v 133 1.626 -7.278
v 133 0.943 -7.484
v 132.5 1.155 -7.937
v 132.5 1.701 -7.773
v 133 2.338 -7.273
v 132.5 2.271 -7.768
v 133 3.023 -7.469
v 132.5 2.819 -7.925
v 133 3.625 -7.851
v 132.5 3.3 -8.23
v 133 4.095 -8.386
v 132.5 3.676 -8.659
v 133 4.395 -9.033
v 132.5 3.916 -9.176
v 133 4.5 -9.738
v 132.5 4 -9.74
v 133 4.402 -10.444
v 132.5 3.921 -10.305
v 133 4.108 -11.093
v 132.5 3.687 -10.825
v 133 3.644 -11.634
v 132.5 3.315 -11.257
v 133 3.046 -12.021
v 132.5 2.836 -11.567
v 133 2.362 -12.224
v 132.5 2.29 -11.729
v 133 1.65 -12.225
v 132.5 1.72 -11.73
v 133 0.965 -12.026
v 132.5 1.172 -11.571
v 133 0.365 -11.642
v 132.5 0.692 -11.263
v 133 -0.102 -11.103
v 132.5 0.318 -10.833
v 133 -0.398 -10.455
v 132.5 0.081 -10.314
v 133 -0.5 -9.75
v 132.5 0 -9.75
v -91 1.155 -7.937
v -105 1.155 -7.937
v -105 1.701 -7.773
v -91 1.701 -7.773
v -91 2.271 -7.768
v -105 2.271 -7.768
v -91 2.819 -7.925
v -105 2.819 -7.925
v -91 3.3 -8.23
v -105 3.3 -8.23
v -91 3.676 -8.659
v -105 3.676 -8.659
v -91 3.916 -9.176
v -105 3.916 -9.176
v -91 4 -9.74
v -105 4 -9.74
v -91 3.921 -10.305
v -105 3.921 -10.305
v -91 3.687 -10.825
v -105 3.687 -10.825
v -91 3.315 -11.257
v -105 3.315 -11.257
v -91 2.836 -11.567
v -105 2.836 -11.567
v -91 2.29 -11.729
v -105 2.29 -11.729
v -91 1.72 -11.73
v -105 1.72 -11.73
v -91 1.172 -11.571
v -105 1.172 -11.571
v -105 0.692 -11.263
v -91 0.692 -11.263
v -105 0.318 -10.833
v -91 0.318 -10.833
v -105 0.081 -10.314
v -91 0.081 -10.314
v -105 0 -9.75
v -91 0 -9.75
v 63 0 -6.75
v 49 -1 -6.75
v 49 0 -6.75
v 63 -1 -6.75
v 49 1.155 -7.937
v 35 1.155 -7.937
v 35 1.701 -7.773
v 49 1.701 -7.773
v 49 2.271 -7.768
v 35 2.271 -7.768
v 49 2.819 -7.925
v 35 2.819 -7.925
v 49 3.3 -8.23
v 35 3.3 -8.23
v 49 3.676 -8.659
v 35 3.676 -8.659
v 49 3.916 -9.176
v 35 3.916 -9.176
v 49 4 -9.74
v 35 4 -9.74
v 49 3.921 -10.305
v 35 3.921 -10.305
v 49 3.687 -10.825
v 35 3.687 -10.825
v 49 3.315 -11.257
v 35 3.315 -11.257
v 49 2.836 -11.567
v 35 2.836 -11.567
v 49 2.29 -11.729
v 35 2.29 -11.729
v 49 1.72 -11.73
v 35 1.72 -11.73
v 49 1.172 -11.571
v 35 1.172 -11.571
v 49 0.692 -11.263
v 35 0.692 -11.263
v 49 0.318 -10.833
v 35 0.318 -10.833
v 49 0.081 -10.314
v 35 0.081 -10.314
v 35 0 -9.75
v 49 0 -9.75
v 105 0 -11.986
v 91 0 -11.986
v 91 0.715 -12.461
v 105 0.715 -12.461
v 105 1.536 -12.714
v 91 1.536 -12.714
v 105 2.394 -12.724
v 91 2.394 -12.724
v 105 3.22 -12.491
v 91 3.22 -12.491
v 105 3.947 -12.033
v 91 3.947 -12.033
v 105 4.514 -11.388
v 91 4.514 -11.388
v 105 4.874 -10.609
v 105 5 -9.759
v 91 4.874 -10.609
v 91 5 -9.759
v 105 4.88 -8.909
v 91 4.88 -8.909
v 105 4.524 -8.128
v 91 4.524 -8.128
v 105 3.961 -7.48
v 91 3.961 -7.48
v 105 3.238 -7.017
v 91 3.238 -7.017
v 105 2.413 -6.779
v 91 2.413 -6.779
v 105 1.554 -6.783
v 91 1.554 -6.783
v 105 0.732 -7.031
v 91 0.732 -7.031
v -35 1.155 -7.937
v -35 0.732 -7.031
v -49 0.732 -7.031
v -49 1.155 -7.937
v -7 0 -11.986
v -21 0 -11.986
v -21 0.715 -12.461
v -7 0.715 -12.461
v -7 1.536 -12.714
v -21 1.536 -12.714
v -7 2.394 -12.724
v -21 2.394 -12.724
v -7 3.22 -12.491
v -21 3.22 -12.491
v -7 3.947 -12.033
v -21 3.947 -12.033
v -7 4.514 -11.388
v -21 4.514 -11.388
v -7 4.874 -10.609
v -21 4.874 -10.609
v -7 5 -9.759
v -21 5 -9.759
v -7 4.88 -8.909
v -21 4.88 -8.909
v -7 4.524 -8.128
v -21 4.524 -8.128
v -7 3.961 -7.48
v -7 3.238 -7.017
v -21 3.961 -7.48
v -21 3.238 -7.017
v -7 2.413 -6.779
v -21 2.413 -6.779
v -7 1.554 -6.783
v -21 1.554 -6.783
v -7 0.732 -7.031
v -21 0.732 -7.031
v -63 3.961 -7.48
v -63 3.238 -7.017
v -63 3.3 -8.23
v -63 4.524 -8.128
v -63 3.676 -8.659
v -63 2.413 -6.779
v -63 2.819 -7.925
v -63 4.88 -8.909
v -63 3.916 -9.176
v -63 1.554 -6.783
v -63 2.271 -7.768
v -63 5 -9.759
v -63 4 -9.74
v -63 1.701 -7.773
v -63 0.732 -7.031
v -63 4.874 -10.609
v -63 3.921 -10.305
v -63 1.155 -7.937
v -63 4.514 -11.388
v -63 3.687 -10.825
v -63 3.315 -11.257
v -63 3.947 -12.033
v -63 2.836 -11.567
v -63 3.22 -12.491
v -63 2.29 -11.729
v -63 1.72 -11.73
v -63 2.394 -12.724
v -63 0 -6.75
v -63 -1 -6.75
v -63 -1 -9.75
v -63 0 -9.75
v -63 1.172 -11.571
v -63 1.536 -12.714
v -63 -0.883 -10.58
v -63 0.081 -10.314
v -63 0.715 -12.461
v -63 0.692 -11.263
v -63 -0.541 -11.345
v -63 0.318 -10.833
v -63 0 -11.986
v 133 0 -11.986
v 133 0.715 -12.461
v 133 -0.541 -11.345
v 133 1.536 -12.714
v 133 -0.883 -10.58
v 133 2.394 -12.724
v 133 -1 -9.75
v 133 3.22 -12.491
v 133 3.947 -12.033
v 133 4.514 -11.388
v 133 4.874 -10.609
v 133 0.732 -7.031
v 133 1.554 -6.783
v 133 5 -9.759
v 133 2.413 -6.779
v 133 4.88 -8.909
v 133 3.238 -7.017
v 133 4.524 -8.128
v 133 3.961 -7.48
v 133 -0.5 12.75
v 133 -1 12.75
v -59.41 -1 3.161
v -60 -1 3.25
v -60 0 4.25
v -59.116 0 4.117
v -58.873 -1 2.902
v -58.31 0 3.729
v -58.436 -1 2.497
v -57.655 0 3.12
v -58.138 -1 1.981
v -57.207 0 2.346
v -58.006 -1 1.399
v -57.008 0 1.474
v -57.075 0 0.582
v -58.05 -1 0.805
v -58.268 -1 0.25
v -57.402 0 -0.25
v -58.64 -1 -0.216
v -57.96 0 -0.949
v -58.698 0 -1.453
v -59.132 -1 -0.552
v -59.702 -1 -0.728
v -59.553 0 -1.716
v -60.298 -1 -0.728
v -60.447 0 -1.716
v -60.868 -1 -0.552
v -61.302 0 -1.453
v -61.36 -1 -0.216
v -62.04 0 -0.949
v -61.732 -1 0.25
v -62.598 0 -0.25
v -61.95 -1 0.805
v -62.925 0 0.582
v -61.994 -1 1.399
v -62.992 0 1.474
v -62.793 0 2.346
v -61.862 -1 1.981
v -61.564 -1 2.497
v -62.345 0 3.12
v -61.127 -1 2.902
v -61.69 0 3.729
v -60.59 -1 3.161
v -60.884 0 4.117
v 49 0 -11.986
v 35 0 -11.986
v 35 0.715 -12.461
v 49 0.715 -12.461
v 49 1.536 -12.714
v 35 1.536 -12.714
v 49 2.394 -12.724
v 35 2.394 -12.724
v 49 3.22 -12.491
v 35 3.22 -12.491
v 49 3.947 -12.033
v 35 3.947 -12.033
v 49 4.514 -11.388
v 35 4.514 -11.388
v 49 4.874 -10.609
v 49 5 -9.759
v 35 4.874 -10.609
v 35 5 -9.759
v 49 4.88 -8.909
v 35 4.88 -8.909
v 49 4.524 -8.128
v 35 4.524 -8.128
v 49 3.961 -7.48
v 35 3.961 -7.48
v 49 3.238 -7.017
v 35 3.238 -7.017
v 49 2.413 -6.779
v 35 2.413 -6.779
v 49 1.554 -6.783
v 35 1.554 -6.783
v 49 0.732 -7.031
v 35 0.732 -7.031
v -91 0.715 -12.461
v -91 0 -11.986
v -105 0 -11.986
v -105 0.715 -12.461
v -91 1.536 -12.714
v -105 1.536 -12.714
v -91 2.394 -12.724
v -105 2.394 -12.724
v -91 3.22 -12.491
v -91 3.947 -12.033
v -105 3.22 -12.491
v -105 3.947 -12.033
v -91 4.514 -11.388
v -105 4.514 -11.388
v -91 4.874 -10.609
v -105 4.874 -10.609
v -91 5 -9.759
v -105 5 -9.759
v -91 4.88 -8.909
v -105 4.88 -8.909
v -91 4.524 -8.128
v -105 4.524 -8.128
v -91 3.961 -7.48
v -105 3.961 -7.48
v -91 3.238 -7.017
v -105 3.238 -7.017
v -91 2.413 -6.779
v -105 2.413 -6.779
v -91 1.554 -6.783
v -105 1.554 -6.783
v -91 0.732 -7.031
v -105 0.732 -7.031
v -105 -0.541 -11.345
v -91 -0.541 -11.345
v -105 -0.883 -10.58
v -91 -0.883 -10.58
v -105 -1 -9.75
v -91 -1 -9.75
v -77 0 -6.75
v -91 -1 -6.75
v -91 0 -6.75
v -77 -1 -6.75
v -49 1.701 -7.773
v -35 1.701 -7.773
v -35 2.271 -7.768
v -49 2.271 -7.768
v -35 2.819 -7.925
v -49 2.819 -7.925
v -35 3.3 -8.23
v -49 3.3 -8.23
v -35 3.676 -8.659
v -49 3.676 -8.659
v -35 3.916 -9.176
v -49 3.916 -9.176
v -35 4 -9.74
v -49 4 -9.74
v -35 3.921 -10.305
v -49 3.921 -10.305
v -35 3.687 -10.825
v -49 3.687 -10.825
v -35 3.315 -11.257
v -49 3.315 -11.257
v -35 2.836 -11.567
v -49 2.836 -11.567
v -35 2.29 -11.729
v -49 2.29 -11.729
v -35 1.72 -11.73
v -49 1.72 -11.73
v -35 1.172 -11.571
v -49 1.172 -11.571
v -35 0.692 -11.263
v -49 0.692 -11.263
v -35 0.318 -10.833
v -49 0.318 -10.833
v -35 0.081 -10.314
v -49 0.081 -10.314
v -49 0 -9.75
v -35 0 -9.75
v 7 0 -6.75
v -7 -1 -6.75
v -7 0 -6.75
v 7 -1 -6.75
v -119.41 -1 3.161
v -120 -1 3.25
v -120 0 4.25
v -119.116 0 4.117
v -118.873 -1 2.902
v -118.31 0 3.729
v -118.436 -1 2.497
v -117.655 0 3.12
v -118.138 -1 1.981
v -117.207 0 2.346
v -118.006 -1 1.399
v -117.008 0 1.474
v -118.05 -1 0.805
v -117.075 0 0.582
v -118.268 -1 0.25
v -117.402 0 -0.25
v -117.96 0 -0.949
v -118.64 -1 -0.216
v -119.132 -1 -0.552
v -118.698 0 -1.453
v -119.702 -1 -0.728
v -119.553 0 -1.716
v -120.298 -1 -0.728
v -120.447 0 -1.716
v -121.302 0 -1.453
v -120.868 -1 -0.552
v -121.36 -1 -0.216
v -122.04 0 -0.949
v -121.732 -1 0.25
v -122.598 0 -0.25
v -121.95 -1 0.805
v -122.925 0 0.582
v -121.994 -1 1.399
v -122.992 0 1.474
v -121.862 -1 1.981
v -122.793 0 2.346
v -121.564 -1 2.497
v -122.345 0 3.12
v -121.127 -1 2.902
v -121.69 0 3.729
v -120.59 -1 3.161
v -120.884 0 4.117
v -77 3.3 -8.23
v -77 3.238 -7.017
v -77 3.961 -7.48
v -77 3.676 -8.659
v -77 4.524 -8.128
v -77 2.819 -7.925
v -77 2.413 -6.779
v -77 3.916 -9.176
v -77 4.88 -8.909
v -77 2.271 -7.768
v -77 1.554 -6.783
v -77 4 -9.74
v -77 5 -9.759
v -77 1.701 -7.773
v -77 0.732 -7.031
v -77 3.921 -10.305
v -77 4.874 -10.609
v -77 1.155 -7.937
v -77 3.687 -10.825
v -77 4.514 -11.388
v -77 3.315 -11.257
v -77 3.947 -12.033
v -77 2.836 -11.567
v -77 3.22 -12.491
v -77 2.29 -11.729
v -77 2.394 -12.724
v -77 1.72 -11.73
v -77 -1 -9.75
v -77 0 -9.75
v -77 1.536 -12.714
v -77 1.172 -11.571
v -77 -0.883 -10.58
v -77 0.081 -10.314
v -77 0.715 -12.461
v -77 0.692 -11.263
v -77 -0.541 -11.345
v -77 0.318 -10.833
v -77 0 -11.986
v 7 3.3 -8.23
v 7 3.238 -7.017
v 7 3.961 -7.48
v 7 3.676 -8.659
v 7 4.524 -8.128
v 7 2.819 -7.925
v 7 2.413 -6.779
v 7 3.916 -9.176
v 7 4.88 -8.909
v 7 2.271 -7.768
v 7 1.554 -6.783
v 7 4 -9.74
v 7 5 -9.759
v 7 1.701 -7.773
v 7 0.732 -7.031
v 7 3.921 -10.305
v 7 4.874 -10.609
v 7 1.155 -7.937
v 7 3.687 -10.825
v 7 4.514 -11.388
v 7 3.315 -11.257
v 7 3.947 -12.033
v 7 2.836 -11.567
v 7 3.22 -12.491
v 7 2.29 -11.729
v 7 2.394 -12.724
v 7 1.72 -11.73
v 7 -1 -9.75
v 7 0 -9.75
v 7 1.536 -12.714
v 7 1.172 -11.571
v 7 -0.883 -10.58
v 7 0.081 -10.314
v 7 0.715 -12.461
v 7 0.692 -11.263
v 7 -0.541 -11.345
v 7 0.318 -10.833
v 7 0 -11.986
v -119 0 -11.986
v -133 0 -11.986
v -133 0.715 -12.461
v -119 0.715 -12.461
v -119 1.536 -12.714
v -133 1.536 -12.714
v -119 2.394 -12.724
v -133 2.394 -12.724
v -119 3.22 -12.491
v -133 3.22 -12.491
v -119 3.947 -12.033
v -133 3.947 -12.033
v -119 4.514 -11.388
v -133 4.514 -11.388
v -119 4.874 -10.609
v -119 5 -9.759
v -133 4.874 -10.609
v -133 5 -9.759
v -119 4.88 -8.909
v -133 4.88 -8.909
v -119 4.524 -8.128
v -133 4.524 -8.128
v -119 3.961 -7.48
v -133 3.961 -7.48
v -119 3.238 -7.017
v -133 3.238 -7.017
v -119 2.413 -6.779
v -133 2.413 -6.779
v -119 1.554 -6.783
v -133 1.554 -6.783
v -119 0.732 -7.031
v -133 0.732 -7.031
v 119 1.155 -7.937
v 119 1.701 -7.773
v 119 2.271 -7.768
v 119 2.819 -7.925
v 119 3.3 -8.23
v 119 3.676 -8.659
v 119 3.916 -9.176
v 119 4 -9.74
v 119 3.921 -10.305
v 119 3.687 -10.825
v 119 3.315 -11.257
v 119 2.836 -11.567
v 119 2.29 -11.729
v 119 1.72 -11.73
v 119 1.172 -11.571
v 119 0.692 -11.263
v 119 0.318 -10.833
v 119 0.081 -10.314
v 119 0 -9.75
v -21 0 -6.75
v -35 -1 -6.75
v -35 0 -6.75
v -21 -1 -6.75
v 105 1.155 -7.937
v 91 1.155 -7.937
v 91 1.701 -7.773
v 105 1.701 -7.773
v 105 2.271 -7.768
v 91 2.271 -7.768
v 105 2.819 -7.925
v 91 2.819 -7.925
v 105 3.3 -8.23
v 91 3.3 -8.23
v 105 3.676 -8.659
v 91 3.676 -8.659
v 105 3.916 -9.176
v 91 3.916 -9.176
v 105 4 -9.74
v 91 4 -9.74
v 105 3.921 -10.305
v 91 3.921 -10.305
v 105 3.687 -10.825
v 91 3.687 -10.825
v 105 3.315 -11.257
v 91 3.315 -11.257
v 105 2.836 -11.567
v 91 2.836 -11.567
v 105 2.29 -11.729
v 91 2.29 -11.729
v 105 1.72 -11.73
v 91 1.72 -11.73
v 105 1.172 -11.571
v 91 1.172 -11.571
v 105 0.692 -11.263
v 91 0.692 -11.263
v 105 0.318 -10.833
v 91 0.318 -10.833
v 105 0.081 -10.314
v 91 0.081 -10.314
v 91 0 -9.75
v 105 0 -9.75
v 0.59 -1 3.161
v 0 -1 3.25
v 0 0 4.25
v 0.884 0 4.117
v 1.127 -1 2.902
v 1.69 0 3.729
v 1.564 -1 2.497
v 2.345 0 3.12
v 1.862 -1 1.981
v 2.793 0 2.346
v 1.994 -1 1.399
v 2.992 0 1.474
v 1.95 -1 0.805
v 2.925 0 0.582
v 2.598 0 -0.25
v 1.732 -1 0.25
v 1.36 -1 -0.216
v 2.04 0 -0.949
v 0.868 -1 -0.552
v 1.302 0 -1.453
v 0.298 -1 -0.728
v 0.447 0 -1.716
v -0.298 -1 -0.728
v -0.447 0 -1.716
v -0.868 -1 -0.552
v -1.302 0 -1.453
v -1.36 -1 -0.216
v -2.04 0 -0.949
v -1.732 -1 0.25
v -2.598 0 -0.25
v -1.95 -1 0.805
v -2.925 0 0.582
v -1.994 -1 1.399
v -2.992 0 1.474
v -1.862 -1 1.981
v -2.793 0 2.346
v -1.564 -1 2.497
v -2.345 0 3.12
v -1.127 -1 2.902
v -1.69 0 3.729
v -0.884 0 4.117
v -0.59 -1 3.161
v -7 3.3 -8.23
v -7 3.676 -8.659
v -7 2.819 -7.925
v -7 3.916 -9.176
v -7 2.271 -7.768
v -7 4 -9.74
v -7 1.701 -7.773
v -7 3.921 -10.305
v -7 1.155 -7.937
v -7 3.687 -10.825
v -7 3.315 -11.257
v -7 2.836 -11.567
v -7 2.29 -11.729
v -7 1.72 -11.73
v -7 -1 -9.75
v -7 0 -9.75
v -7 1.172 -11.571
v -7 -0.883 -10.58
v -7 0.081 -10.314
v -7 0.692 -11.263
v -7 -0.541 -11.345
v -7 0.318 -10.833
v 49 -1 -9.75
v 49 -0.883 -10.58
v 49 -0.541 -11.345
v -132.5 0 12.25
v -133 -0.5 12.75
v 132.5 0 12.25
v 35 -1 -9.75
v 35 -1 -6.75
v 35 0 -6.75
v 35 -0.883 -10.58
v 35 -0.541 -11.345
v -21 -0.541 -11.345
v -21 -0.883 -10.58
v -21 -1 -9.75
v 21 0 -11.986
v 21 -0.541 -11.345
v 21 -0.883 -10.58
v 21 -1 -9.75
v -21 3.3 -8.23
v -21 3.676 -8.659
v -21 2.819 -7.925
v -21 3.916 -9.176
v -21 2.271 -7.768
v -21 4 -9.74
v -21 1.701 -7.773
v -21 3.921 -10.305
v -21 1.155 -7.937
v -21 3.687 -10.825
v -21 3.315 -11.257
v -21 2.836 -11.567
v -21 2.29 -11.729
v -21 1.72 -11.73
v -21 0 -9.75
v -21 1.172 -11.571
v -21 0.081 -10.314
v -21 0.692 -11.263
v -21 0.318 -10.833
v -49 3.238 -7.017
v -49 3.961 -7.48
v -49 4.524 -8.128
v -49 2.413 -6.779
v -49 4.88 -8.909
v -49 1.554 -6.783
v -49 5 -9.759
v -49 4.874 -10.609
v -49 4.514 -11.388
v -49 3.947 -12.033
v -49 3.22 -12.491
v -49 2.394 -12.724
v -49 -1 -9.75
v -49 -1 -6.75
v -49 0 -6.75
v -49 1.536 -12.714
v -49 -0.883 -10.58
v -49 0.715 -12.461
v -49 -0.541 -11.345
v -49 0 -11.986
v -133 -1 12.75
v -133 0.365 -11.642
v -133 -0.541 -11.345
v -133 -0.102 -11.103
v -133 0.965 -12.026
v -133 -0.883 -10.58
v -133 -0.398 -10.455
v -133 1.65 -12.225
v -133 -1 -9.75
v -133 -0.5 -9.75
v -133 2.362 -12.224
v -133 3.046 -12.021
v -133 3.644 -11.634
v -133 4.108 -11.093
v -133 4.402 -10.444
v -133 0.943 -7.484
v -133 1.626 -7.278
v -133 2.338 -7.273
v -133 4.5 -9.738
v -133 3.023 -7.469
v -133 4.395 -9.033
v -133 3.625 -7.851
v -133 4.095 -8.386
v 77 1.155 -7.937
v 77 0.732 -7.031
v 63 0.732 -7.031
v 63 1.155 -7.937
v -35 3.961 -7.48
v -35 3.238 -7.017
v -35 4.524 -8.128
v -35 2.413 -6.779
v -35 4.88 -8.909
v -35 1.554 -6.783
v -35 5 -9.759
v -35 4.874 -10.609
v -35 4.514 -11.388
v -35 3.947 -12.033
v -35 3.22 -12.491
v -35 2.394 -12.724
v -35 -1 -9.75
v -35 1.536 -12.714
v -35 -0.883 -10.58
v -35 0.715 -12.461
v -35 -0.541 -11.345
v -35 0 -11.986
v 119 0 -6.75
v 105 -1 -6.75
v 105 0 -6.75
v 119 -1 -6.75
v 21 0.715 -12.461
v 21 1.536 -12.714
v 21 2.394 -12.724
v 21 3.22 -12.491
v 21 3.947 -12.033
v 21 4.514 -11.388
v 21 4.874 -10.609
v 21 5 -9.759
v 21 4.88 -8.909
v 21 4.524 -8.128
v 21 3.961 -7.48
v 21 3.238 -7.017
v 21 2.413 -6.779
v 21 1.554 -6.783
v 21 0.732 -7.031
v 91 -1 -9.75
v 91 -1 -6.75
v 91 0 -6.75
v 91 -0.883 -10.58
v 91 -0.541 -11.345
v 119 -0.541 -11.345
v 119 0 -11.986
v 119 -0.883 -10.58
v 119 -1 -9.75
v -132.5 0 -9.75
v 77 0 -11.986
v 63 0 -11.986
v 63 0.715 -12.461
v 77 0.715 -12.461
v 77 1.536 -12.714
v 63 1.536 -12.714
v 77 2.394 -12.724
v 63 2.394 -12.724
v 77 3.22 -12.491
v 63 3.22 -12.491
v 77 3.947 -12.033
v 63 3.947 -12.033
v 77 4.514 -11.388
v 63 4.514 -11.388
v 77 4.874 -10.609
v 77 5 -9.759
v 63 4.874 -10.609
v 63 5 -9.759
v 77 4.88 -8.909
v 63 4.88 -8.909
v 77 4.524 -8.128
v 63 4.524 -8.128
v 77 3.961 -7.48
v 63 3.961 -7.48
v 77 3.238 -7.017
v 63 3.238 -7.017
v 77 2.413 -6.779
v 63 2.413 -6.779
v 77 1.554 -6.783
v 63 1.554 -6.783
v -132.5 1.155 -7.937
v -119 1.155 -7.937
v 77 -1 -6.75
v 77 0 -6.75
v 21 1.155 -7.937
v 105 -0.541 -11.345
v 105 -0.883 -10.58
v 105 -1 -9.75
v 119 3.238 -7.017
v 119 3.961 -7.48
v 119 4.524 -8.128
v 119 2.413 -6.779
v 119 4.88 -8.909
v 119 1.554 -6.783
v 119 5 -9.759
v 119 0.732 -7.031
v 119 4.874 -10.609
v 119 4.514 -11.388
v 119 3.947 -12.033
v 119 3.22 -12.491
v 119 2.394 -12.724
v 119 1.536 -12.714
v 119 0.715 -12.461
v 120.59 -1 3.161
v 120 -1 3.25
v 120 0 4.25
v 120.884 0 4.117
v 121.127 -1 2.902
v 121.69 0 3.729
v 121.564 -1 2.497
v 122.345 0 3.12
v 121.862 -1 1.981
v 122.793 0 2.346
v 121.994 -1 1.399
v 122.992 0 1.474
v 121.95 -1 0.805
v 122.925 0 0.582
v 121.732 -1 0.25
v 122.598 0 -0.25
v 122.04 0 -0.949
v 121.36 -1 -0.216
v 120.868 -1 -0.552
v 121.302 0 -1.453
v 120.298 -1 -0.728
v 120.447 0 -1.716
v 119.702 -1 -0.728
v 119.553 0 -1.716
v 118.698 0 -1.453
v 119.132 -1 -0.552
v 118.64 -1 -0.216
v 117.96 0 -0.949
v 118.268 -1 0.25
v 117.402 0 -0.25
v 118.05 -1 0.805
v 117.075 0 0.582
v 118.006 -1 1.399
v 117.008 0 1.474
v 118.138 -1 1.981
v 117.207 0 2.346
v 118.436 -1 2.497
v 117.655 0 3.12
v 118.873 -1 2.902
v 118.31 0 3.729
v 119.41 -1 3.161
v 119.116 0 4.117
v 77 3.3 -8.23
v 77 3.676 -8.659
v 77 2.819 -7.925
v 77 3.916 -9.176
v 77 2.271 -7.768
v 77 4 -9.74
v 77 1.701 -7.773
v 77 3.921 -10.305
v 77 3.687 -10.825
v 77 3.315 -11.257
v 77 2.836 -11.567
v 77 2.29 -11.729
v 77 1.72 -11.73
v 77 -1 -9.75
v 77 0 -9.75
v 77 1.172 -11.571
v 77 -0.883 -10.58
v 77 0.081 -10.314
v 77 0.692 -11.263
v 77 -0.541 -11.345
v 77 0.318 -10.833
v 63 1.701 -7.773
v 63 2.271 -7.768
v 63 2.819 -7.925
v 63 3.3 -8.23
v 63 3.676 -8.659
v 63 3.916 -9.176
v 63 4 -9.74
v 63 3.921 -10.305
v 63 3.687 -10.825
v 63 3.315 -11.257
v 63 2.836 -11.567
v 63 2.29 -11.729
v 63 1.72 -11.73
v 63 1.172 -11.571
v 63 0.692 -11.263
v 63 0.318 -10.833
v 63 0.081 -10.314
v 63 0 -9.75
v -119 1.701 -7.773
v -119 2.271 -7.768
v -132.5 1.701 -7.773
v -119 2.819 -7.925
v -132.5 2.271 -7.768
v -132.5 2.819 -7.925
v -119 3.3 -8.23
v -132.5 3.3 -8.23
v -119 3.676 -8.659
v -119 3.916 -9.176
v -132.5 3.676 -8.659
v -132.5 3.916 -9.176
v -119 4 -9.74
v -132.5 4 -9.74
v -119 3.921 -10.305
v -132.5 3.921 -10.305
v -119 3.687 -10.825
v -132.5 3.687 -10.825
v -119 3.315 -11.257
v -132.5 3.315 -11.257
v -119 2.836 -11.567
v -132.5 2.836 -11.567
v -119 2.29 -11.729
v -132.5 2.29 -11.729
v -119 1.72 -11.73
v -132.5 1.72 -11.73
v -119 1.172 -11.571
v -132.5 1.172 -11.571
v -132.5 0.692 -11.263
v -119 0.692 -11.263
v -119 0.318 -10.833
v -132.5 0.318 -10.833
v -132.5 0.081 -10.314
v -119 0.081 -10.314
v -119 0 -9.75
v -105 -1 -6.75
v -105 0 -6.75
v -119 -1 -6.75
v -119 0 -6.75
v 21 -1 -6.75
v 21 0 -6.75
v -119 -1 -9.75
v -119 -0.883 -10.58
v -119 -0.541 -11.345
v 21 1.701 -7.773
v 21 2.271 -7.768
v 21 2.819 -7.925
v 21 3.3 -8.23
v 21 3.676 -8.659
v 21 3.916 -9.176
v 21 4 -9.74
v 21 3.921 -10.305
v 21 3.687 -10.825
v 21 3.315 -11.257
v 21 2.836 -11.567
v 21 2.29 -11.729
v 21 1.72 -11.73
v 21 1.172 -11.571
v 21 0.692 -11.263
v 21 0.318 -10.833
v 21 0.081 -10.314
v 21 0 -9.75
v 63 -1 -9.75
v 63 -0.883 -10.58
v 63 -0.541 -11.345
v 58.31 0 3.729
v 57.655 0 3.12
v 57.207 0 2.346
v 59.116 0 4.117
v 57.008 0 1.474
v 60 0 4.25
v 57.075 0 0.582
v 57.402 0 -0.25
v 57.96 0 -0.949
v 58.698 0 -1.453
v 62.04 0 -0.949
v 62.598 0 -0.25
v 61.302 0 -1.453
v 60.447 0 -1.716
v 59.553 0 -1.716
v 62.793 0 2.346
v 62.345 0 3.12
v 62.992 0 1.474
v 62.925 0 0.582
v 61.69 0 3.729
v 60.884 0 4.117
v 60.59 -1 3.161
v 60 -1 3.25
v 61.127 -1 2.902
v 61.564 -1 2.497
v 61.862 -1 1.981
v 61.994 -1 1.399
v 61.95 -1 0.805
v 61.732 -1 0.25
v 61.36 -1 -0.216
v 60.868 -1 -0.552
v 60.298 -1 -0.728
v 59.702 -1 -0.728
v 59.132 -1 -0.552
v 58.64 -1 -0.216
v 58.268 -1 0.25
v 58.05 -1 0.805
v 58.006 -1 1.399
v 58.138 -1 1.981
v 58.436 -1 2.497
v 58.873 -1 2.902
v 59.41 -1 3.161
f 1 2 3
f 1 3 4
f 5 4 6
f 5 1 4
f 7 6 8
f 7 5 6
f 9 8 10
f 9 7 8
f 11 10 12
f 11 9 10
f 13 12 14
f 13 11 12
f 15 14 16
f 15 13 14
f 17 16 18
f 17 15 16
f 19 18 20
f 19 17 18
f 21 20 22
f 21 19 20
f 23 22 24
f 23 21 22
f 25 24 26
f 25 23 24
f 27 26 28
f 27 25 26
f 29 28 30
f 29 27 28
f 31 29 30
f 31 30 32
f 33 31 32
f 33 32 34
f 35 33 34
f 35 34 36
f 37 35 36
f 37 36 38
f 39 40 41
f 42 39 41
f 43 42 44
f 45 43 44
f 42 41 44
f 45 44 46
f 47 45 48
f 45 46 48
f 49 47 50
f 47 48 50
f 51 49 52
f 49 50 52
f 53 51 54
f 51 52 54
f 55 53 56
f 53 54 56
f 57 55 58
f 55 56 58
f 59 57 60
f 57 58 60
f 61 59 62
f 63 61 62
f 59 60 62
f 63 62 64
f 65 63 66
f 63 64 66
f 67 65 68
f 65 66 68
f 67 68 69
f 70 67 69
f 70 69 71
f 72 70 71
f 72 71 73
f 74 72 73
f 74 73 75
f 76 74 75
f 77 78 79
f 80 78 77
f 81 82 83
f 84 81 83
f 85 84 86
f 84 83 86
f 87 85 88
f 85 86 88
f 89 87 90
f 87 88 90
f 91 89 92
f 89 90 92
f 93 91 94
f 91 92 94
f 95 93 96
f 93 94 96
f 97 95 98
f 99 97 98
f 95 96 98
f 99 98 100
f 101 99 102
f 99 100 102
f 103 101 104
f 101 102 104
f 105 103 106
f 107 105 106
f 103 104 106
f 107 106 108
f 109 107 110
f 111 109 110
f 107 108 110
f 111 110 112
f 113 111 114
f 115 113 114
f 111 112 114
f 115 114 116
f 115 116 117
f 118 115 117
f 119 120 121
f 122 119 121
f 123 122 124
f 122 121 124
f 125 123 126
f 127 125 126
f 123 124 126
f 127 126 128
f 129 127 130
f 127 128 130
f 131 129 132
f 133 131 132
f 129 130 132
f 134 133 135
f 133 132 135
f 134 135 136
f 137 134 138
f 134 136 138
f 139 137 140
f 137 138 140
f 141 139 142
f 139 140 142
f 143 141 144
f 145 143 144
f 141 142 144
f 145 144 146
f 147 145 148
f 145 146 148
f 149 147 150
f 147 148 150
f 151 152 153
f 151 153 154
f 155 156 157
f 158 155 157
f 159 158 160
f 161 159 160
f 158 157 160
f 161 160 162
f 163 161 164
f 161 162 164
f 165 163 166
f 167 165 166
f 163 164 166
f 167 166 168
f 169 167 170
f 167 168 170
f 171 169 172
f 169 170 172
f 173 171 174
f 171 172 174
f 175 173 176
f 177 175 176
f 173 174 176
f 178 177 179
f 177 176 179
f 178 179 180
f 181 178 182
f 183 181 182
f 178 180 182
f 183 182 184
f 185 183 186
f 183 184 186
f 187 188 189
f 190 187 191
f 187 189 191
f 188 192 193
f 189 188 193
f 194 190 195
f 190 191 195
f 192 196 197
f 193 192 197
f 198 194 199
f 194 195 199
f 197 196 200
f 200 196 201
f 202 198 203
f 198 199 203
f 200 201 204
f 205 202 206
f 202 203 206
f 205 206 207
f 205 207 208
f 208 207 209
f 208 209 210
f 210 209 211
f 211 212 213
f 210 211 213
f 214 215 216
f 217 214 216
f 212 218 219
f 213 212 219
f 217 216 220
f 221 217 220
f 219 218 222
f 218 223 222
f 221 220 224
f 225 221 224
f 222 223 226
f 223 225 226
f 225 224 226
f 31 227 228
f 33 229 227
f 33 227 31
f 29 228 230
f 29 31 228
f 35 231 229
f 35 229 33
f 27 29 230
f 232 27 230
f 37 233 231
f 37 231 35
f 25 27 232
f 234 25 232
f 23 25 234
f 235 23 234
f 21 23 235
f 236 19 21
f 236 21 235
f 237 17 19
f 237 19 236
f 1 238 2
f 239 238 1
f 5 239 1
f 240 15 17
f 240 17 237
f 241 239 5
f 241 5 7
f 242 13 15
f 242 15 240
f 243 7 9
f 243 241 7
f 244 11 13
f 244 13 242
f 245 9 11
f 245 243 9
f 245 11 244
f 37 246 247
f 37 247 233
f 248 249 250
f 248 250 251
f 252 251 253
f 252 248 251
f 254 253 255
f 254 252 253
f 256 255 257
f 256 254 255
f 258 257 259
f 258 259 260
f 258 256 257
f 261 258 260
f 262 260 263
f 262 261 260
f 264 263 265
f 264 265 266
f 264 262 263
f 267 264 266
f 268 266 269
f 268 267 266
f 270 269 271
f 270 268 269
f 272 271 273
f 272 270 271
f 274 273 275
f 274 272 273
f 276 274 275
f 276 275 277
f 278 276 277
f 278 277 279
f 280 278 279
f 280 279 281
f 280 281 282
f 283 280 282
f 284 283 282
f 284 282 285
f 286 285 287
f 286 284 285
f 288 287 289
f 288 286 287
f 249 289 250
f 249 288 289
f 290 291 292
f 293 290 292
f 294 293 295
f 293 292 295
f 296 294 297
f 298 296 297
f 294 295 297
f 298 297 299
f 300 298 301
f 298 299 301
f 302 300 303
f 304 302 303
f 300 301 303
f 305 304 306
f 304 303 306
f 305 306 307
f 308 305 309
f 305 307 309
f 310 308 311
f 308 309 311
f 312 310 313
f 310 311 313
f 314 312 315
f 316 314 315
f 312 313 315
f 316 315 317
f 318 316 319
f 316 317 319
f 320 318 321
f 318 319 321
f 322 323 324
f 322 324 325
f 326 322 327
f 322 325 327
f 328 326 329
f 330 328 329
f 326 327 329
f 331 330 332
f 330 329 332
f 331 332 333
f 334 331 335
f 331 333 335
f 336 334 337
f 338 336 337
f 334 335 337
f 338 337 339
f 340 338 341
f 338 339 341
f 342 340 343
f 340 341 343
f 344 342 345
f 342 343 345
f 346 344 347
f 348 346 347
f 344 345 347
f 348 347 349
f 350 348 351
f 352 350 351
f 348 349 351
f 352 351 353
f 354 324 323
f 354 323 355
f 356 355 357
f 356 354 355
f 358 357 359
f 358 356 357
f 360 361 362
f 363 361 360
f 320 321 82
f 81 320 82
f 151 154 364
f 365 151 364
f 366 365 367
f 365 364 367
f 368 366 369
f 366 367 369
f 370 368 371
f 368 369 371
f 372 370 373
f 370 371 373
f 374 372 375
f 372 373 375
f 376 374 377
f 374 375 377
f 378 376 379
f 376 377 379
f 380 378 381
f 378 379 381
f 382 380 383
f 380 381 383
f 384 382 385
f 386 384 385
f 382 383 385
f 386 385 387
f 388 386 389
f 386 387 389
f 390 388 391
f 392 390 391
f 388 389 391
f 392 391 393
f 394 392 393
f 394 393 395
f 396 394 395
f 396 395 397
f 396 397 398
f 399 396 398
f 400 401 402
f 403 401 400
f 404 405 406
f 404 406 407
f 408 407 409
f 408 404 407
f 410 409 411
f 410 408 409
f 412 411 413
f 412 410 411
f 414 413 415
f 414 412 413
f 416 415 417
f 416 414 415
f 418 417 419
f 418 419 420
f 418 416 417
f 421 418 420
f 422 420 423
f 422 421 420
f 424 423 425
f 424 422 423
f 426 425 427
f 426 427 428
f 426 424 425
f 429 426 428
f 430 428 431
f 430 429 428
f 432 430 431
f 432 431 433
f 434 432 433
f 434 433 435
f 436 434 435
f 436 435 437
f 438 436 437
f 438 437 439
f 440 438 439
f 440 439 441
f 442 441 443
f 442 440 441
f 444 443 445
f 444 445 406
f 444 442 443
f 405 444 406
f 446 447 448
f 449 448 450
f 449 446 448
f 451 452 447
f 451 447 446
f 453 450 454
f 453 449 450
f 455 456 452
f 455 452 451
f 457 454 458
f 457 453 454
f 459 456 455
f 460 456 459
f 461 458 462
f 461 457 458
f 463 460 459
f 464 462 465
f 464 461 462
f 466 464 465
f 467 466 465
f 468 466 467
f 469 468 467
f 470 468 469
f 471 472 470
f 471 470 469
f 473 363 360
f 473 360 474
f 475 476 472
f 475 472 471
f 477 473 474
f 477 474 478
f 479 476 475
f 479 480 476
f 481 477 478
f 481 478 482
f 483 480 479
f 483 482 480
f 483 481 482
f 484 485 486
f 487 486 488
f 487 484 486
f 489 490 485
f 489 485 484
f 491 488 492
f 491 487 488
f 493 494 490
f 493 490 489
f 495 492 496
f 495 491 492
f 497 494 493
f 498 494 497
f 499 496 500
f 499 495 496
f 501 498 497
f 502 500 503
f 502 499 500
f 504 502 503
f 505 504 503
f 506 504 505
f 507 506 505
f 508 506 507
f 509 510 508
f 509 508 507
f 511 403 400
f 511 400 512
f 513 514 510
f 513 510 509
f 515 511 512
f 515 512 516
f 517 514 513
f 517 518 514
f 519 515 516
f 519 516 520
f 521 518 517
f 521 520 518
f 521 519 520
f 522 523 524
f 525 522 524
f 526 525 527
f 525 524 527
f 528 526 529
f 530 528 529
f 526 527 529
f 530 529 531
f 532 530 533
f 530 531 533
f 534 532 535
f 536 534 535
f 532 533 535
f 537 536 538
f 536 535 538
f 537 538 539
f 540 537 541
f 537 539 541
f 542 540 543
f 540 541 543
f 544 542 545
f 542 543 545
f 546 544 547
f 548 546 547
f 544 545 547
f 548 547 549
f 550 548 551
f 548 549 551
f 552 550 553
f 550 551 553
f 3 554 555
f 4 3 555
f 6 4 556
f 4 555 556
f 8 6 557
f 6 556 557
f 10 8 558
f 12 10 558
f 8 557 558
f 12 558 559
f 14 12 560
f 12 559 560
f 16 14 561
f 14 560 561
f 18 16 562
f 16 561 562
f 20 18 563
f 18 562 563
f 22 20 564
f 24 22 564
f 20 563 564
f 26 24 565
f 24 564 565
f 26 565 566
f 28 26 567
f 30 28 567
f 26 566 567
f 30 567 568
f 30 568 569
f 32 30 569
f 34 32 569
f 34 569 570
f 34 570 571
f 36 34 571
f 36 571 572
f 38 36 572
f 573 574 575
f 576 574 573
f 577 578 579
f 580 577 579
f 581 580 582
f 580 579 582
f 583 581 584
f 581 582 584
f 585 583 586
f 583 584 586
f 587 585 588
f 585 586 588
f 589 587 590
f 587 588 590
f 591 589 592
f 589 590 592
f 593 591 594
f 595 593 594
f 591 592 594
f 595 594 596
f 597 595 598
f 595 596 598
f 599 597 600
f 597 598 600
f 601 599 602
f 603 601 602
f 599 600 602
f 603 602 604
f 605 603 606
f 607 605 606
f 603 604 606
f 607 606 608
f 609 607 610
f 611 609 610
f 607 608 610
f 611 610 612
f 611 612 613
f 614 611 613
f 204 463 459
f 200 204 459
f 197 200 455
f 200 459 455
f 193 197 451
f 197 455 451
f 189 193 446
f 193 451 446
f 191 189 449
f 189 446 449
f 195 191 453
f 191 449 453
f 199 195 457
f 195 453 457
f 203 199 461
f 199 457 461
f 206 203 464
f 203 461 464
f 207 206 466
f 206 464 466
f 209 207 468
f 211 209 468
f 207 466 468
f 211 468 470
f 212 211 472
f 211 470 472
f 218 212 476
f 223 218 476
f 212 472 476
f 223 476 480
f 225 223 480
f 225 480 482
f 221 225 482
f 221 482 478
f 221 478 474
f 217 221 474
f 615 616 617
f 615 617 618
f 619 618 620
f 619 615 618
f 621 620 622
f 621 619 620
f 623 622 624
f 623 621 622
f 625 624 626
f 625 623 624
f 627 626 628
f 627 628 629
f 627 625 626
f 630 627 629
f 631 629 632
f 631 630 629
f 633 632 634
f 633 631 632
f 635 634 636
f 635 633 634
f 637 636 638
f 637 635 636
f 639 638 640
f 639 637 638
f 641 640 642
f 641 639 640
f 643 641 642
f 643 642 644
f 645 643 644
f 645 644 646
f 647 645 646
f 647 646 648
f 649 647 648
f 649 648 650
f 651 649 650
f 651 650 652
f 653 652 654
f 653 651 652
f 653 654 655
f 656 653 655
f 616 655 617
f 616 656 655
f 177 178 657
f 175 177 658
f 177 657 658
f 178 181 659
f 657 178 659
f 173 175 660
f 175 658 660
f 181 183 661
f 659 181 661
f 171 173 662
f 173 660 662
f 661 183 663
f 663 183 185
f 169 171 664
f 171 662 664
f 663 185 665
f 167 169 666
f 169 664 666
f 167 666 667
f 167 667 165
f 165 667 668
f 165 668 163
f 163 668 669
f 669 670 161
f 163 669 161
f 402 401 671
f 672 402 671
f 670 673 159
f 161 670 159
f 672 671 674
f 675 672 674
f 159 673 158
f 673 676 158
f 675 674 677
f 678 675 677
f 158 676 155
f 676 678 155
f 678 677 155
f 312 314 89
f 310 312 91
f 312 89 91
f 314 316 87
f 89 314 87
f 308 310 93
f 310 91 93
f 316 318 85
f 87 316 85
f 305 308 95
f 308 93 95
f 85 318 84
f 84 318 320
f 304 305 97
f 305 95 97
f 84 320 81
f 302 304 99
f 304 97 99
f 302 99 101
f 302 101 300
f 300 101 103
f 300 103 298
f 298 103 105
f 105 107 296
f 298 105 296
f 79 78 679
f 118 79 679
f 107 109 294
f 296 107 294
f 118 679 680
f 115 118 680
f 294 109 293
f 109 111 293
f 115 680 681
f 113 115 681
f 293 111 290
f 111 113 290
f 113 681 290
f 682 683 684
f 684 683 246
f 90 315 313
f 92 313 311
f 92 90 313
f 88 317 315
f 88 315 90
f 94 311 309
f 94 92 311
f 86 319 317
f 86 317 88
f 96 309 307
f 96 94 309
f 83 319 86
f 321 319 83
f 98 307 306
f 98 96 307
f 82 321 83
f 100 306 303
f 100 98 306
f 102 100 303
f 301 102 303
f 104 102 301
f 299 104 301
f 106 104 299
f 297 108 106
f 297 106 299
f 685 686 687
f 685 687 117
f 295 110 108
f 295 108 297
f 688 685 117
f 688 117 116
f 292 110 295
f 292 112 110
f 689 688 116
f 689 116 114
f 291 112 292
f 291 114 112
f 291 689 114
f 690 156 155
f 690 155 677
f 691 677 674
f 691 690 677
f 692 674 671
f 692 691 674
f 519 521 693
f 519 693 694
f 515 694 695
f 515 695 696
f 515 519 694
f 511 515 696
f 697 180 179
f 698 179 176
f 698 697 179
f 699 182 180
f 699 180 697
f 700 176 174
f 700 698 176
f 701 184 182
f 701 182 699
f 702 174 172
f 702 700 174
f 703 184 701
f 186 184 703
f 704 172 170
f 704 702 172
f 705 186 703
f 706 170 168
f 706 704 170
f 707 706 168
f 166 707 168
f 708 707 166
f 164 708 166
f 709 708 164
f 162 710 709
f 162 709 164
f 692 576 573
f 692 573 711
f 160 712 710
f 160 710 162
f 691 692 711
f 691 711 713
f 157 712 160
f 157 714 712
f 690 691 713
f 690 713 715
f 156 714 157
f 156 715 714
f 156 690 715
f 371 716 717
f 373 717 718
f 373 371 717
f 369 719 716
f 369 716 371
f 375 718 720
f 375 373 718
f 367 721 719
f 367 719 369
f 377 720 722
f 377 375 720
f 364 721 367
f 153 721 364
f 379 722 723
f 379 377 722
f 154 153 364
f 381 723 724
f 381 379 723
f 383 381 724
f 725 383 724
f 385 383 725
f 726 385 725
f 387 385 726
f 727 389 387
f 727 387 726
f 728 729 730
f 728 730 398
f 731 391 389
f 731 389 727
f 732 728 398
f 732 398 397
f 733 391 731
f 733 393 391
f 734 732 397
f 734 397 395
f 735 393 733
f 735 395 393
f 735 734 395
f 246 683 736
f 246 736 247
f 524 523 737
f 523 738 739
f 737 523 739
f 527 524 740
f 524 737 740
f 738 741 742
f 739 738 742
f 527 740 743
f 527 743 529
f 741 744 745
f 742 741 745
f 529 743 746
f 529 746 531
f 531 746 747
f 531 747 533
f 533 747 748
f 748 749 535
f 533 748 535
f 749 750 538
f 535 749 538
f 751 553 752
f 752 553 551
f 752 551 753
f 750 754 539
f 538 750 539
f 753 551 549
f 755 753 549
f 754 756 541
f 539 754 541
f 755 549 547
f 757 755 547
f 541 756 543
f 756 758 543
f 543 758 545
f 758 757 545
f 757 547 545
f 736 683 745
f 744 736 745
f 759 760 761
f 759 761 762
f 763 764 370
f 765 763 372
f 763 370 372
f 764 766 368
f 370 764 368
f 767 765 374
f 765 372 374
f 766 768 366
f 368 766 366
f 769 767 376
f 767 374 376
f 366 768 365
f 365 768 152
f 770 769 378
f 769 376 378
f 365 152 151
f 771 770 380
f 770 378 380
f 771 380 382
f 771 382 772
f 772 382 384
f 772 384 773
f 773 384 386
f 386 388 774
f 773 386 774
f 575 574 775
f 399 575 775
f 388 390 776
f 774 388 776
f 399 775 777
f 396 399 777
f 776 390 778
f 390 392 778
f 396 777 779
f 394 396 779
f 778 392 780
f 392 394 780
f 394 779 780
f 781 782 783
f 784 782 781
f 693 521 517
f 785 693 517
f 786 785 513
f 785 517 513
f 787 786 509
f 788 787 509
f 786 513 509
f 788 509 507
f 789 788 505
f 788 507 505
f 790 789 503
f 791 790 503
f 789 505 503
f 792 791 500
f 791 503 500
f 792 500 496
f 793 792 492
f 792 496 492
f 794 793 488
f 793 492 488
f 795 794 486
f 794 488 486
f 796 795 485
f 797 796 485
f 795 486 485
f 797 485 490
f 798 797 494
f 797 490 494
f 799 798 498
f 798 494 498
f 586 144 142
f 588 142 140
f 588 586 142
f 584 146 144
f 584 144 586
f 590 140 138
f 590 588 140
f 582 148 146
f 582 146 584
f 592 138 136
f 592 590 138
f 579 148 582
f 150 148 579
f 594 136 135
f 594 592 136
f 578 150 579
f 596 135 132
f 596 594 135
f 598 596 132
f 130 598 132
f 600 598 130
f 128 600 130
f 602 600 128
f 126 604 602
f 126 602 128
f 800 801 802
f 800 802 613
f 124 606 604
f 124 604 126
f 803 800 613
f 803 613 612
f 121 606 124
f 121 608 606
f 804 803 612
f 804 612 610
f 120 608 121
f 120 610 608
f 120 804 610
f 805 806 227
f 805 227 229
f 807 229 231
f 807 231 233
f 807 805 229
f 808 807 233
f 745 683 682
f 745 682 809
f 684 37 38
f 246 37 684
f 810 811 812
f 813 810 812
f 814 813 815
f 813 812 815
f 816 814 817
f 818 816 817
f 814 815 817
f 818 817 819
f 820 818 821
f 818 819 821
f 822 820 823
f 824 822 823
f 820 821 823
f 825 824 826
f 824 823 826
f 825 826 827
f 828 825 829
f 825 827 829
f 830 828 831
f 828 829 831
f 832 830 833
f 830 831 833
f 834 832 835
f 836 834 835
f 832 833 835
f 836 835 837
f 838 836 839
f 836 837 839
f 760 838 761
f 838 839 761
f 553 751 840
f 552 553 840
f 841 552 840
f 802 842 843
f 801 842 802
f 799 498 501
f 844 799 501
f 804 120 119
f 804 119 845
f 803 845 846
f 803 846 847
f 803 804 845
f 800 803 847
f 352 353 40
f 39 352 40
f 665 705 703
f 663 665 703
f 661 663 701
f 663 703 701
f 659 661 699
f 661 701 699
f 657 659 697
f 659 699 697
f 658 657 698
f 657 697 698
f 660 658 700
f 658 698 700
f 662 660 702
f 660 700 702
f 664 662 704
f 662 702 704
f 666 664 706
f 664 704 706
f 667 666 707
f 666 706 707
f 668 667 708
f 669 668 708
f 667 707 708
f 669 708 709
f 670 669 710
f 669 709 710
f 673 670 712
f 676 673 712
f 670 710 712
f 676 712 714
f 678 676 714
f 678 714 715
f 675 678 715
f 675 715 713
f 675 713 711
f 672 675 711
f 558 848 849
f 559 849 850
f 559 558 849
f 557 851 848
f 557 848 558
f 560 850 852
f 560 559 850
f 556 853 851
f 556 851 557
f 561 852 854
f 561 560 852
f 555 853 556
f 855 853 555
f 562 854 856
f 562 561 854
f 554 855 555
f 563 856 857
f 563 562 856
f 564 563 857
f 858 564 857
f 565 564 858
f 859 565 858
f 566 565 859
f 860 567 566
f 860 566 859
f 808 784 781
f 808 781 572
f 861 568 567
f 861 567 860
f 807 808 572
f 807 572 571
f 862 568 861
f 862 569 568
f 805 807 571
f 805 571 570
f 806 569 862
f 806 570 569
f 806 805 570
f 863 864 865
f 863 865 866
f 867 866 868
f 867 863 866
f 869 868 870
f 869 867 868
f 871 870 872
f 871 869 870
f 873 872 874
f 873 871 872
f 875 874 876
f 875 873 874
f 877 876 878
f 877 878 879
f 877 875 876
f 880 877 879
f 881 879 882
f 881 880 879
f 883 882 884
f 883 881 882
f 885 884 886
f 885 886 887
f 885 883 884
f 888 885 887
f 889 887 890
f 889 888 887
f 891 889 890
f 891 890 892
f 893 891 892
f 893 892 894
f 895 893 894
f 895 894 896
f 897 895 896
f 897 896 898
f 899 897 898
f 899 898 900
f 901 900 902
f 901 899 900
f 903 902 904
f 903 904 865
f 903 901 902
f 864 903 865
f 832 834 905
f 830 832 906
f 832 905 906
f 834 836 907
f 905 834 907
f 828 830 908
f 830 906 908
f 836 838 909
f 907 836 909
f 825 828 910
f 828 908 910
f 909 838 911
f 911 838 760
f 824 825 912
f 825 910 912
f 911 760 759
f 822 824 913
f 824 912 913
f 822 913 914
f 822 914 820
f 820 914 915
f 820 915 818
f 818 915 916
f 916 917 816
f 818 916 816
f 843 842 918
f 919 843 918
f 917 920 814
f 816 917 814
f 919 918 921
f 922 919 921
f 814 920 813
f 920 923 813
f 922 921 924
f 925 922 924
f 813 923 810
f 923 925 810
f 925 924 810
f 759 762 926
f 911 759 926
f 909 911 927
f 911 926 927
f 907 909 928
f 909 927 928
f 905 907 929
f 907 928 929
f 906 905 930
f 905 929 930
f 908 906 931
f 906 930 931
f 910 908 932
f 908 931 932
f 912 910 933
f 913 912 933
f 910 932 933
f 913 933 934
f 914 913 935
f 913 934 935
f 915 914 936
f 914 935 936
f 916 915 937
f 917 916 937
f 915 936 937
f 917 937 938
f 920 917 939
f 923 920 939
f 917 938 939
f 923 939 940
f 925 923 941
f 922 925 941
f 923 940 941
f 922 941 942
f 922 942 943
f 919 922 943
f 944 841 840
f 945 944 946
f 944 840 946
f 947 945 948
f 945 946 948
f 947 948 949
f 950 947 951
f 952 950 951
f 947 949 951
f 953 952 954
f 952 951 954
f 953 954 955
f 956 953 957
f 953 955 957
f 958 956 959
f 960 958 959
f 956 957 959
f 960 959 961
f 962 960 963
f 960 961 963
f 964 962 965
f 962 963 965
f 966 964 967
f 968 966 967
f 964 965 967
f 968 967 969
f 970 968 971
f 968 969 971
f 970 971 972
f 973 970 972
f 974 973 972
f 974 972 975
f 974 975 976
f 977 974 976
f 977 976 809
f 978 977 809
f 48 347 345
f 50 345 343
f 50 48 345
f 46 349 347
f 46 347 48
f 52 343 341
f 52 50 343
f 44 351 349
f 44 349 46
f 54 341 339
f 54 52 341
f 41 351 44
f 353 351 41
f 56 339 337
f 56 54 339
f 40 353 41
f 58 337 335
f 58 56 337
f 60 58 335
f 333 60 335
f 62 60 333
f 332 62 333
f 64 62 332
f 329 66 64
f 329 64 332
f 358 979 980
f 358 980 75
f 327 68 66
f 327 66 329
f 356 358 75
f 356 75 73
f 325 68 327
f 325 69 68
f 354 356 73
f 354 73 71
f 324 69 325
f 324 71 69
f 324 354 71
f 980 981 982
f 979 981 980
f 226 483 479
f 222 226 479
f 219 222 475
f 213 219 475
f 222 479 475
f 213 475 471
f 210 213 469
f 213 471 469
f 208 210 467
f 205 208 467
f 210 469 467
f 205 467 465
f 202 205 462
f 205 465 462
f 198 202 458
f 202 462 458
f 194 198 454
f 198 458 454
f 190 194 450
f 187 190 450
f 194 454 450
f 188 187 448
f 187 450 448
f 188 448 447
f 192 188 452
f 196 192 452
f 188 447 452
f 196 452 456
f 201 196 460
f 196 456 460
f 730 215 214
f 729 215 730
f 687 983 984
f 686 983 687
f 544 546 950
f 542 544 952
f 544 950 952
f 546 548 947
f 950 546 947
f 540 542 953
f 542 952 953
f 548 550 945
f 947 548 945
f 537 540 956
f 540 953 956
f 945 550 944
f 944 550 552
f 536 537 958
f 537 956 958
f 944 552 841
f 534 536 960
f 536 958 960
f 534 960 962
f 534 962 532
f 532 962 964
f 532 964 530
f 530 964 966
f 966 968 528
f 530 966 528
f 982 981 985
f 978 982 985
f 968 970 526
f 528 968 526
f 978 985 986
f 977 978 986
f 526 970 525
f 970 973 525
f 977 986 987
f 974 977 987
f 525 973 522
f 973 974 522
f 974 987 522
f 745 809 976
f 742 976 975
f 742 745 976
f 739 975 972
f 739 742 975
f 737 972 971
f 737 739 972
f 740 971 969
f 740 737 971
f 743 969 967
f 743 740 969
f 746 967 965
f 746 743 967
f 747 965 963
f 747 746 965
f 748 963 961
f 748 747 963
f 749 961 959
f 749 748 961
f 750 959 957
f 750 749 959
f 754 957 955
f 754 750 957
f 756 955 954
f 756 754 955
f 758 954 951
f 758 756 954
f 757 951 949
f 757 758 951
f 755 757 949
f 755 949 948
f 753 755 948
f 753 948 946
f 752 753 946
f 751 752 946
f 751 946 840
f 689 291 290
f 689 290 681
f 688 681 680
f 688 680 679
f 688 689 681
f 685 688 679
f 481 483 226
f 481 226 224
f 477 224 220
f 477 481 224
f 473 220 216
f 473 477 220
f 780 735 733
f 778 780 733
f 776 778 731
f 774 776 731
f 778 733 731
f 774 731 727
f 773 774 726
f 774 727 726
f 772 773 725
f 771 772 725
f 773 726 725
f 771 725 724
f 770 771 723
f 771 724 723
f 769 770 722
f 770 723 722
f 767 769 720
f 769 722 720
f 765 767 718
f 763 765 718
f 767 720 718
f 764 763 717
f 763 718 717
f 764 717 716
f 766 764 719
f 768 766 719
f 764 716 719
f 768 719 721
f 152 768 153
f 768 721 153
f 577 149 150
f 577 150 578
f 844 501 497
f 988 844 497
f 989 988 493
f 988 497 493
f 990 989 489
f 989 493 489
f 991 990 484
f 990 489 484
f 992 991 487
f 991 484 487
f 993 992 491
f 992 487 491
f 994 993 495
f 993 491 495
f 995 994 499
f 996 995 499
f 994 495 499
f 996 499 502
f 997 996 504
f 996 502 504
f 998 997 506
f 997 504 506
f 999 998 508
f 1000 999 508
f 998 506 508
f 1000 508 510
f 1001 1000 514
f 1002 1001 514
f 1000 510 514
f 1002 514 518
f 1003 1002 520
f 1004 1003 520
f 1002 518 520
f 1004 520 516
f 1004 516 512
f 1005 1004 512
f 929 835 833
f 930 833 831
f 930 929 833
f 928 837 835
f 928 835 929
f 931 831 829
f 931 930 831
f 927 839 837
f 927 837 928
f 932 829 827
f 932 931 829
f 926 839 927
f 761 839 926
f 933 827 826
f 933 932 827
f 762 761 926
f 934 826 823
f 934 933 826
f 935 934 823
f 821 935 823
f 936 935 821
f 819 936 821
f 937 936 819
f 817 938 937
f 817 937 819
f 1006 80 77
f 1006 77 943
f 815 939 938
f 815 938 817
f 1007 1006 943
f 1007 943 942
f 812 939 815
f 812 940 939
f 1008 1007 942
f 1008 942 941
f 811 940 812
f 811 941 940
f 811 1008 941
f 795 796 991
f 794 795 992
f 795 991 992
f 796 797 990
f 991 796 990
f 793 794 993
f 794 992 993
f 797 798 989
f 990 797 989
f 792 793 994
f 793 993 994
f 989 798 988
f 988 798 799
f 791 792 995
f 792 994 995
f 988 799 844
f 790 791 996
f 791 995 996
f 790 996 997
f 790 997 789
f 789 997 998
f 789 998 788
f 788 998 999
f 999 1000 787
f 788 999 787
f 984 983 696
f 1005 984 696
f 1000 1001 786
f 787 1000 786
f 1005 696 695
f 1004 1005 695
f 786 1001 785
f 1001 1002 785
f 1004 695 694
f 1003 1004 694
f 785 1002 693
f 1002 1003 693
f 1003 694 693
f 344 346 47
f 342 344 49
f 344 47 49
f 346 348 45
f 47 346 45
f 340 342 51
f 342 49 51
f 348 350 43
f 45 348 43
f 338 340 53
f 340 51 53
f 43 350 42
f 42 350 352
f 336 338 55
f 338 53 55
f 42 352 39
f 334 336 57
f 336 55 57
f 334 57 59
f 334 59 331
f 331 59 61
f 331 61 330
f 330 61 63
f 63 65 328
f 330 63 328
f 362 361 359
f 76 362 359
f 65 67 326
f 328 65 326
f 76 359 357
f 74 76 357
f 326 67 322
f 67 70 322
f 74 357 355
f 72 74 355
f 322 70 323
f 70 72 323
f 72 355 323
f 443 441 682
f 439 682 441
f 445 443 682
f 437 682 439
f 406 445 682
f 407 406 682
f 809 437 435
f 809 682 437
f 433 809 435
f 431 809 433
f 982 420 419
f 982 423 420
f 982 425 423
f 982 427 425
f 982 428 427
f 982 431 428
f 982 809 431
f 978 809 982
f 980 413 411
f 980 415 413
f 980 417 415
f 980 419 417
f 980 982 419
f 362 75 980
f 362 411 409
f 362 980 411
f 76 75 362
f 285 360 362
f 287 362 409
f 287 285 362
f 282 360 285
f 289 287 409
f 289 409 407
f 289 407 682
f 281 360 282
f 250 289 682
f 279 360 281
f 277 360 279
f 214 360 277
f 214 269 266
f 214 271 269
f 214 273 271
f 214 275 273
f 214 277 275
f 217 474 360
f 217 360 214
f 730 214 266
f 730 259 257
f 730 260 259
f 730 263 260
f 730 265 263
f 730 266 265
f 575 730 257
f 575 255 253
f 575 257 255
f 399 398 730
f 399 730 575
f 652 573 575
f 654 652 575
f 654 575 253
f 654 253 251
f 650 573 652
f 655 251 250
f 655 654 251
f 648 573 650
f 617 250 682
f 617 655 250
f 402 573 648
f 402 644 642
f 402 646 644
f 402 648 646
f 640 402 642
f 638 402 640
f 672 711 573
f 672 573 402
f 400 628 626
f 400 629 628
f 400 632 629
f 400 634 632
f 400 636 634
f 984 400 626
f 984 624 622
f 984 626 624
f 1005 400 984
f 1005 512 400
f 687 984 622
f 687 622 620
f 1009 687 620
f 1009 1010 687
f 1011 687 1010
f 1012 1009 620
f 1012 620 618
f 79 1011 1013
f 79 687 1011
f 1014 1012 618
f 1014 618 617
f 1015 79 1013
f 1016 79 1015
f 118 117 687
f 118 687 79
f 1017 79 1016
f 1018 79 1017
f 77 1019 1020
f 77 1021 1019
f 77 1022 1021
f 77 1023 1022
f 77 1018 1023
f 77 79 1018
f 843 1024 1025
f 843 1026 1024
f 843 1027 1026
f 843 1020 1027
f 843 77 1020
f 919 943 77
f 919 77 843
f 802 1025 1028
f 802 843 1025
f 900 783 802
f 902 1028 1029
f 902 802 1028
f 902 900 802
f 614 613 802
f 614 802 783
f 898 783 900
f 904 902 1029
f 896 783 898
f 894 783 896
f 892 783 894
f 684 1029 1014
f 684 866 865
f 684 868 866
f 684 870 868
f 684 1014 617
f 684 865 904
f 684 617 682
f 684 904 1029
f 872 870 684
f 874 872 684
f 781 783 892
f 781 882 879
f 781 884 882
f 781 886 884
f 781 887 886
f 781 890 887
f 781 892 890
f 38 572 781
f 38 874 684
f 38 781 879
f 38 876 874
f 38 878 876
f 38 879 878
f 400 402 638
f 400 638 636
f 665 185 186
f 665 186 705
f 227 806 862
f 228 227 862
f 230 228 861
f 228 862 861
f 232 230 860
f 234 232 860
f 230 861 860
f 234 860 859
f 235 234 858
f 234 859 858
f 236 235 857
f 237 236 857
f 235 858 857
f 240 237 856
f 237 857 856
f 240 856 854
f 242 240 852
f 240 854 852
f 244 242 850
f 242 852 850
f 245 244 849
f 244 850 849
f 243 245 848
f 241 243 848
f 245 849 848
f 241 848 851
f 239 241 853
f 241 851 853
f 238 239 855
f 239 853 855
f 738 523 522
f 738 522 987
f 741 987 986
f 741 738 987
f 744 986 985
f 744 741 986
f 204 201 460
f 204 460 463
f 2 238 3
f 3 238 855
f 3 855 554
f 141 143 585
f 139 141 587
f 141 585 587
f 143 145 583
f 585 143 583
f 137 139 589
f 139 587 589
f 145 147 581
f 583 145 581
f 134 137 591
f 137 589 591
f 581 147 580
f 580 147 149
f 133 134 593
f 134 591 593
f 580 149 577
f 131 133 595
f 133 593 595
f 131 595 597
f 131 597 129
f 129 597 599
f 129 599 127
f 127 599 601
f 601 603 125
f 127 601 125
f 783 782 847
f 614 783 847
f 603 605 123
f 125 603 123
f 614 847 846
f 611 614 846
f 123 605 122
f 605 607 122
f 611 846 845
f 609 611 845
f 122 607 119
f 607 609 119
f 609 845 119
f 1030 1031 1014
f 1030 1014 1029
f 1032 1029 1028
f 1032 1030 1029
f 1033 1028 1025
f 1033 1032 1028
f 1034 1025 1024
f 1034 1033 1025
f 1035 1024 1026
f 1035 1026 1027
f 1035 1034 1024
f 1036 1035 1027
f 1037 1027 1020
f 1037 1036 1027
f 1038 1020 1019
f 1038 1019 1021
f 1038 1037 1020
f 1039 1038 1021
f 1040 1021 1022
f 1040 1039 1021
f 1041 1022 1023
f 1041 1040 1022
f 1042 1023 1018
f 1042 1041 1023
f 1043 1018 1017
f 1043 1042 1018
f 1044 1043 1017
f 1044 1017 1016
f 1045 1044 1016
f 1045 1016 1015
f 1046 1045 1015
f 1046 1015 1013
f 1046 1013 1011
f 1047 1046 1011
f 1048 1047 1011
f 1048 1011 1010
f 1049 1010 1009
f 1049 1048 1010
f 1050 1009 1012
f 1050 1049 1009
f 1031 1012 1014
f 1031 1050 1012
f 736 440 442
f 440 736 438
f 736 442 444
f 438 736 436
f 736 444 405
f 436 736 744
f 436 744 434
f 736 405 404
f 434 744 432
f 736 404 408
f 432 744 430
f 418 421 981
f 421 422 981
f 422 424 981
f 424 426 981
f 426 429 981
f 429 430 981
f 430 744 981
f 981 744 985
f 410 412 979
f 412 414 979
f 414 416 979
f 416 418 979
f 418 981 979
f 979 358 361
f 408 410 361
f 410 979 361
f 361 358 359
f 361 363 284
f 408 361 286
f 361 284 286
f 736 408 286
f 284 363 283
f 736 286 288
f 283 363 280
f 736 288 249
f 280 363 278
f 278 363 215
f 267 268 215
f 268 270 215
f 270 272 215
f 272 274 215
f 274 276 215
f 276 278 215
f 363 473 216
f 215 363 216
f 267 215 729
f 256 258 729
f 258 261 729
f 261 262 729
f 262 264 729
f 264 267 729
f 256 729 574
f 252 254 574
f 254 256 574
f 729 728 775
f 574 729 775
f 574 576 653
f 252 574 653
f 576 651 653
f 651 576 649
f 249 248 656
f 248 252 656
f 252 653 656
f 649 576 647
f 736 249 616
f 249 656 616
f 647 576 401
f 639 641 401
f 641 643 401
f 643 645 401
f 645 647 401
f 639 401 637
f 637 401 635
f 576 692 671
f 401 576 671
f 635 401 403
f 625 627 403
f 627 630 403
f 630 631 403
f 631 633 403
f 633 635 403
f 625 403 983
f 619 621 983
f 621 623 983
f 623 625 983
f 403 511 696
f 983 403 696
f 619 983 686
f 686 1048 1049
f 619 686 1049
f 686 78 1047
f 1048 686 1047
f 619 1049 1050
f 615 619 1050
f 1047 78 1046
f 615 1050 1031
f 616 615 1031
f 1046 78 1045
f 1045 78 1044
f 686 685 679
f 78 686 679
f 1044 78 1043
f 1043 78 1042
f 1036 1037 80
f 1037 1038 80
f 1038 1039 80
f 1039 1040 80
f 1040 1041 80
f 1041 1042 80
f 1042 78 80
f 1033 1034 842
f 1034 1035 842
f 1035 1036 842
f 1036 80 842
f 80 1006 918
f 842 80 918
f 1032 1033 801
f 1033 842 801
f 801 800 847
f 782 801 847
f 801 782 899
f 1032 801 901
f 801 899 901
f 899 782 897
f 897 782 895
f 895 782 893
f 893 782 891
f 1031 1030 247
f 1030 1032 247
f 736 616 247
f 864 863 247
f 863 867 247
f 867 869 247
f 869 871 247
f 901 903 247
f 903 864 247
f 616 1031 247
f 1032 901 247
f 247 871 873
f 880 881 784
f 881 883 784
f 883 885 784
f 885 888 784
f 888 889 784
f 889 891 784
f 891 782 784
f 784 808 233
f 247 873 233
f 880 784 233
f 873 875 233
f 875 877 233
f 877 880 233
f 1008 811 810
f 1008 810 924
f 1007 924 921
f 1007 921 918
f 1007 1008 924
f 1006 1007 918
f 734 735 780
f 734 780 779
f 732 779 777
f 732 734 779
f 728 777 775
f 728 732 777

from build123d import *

# Parameters (mm, degrees)
SKETCH1_W          = 266
SKETCH1_H          = 25.5
BASE_FLANGE1_DEPTH = 1
HEM1_START         = -133
HEM1_DEPTH         = 266
HEM1_2_DEPTH       = 266
CUT_EXTRUDE1_START = -134.703262862
SKETCH8_W          = 14
SKETCH8_H          = 6
CUT_EXTRUDE1_DEPTH = 259.406525724
LPATTERN1_COUNT    = 11
LPATTERN1_PITCH    = 28
CHAMFER1_SIZE      = 0.5
SKETCH9_R          = 2
CUT_EXTRUDE2_DEPTH = 10
LPATTERN2_COUNT    = 5
LPATTERN2_PITCH    = 60
CHAMFER2_SIZE      = 1


# Read off the part's stored shape, not the designer's step: Hem1
# Sheet-metal steps are written as plain solids
with BuildPart() as part:
    # Sketch1 → Base-Flange1 (new body)
    with BuildSketch(Plane(origin=(0, 0, 0), x_dir=(1, 0, 0), z_dir=(0, 1, 0))):
        Rectangle(SKETCH1_W, SKETCH1_H)
    extrude(amount=-BASE_FLANGE1_DEPTH)

    # Hem1 outline → Hem1 (cut)
    with BuildSketch(Plane.YZ.offset(HEM1_START)):
        with BuildLine():
            Line((0, -12.75), (0, -11.986067977))
            ThreePointArc((0, -11.986067977), (-0.738612788, -10.974744871), (-1, -9.75))
            Line((-1, -9.75), (-1, -12.75))
            Line((-1, -12.75), (0, -12.75))
        make_face()
    extrude(amount=HEM1_DEPTH, mode=Mode.SUBTRACT)

    # Hem1 2 outline → Hem1 2 (add)
    with BuildSketch(Plane.YZ.offset(HEM1_START)):
        with BuildLine():
            Line((0.732145215, -7.031076639), (1.154763477, -7.937384426))
            ThreePointArc((1.154763477, -7.937384426), (3.686782892, -10.824599218), (0, -9.75))
            Line((0, -9.75), (0, -11.986067977))
            ThreePointArc((0, -11.986067977), (4.967777538, -10.18851623), (0.732145215, -7.031076639))
        make_face()
    extrude(amount=HEM1_2_DEPTH)

    # Sketch8 → Cut-Extrude1 (cut)
    with BuildSketch(Plane(origin=(0, 0, 0), x_dir=(1, 0, 0), z_dir=(0, 1, 0)).offset(CUT_EXTRUDE1_START)):
        with Locations((112, 9.75)):
            Rectangle(SKETCH8_W, SKETCH8_H)
    cut_extrude1 = extrude(amount=CUT_EXTRUDE1_DEPTH, mode=Mode.SUBTRACT)

    # LPattern1: Cut-Extrude1 ×11
    with Locations(*[(-i * LPATTERN1_PITCH, 0, 0) for i in range(1, LPATTERN1_COUNT)]):
        add(cut_extrude1, mode=Mode.SUBTRACT)

    # Chamfer1
    chamfer1_edges = [part.edges().sort_by_distance(p)[0] for p in [
        (-133, 0, 1.5),
        (133, 3.686782892, -10.824599218),
        (-133, 3.686782892, -10.824599218),
        (-133, 0, 1.5),
        (0, 0, 12.75),
        (133, 0, 1.5),
    ]]
    chamfer(chamfer1_edges, length=CHAMFER1_SIZE)

    # Sketch9 → Cut-Extrude2 (cut)
    with BuildSketch(Plane(origin=(0, 0, 0), x_dir=(1, 0, 0), z_dir=(0, 1, 0))):
        with Locations(Location((-120, -1.25, 0), (0, 0, 270))):
            Circle(SKETCH9_R)
    cut_extrude2 = extrude(amount=-CUT_EXTRUDE2_DEPTH, mode=Mode.SUBTRACT)

    # LPattern2: Cut-Extrude2 ×5
    with Locations(*[(i * LPATTERN2_PITCH, 0, 0) for i in range(1, LPATTERN2_COUNT)]):
        add(cut_extrude2, mode=Mode.SUBTRACT)

    # Chamfer2
    chamfer2_edges = [part.edges().sort_by_distance(p)[0] for p in [
        (-120, 0, -0.75),
        (-60, 0, -0.75),
        (0, 0, -0.75),
        (60, 0, -0.75),
        (120, 0, -0.75),
    ]]
    chamfer(chamfer2_edges, length=CHAMFER2_SIZE - 0.0001)  # a hair under: the kernel refuses the full size


solid = part.part
